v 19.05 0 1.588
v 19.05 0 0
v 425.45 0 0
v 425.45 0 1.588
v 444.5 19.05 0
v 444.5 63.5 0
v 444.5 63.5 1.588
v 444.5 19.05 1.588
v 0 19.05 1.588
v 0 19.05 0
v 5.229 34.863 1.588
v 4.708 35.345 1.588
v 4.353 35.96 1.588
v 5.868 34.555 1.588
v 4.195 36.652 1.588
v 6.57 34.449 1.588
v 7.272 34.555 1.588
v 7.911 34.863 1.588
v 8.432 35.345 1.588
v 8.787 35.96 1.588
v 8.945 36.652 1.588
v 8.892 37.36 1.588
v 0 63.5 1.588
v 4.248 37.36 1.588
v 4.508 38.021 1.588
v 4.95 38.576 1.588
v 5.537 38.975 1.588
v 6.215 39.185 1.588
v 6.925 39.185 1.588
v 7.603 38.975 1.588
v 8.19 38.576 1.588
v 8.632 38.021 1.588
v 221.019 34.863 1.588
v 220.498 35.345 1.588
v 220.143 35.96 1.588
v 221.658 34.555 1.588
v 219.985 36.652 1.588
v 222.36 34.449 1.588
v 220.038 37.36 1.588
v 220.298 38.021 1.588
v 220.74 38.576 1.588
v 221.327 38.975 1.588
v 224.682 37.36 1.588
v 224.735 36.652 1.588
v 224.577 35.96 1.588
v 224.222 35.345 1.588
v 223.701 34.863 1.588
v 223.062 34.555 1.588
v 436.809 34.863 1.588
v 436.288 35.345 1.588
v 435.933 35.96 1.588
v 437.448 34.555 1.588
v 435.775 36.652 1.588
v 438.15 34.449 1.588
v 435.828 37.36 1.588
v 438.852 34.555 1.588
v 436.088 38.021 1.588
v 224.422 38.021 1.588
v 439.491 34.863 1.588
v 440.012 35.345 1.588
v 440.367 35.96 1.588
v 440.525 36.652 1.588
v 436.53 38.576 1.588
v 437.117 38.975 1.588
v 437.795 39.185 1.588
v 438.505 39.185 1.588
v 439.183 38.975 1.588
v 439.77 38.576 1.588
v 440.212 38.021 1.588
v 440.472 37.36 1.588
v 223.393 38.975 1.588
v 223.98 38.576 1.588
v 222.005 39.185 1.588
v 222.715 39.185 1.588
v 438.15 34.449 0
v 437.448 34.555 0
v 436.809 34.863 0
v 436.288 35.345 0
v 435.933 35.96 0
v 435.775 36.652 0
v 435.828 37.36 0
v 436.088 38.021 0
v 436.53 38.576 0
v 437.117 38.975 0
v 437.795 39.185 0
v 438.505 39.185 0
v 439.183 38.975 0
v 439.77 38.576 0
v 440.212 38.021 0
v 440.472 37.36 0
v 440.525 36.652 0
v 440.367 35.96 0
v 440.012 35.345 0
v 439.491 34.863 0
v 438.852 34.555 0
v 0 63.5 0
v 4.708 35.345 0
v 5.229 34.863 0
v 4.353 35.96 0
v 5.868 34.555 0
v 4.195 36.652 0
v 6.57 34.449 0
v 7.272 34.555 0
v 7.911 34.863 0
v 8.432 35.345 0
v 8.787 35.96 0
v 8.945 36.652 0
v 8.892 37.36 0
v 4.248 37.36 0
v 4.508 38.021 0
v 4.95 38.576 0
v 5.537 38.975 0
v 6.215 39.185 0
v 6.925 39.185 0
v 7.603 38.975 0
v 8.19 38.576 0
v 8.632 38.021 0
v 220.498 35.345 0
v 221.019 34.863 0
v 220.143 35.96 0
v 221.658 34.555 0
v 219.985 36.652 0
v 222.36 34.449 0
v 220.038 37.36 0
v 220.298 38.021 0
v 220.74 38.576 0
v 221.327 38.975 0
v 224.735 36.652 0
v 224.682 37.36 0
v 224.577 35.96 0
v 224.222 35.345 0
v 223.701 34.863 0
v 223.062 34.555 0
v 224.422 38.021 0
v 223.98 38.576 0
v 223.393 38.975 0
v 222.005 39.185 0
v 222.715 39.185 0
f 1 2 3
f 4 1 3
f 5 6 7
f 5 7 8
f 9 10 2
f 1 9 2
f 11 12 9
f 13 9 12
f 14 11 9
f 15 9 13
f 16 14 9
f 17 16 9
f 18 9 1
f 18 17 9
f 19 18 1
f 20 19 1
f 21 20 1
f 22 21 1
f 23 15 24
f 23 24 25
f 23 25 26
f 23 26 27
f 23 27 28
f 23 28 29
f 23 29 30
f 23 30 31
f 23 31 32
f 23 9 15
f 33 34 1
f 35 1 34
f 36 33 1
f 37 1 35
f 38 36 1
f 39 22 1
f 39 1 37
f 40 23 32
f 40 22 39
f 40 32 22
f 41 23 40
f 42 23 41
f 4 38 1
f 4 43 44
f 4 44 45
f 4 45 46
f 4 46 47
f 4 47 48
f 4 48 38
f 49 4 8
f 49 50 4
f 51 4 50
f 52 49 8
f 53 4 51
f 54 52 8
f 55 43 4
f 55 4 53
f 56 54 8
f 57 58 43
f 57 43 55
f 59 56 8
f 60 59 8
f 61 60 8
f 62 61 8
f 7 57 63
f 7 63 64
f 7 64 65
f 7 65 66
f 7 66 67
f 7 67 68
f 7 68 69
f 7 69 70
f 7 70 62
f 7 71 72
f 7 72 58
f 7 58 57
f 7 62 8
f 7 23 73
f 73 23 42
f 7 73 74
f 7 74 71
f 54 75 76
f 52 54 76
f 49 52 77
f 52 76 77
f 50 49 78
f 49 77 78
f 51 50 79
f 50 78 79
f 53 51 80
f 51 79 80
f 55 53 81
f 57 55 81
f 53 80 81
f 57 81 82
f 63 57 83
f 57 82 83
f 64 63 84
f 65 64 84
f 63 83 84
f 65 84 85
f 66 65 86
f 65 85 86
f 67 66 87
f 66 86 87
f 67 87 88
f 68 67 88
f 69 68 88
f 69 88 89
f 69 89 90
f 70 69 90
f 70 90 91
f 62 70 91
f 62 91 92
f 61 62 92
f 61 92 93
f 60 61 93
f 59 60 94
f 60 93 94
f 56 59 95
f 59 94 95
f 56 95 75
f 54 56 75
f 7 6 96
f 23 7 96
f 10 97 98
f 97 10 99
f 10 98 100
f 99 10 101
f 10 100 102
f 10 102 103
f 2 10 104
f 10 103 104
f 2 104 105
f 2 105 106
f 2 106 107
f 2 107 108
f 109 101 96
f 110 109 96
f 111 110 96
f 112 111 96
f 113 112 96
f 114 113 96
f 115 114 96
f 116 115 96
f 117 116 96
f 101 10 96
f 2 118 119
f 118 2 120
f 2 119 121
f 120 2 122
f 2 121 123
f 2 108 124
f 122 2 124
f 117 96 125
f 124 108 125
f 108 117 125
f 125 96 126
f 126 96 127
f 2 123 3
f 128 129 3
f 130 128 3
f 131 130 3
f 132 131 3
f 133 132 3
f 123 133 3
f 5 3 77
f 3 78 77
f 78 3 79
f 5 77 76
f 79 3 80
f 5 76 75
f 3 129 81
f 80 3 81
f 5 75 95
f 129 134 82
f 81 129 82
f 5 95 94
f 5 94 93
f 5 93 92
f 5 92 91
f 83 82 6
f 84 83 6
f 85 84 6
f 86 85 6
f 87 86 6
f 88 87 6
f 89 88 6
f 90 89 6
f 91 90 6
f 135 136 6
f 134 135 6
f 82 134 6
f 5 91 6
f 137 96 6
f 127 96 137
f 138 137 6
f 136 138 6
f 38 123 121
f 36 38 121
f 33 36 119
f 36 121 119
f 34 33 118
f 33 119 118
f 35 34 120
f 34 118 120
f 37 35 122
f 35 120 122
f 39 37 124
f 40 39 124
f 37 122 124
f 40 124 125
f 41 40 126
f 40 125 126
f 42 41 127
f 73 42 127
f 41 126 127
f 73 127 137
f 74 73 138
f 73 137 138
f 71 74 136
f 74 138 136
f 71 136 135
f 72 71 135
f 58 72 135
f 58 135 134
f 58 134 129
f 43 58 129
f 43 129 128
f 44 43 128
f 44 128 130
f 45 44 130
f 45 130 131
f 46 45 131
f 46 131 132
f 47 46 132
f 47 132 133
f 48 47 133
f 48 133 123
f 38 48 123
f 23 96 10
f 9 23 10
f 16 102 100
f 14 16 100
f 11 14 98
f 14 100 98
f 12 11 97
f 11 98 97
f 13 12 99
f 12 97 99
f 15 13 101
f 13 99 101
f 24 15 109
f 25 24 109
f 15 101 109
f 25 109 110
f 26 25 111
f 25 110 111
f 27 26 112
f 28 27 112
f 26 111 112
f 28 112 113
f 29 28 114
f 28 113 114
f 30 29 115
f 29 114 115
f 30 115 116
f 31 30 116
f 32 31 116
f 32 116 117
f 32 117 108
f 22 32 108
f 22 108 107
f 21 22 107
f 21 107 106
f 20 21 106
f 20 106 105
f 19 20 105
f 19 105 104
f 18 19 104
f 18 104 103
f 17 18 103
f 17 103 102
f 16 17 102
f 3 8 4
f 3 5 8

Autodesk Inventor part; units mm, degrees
ref_plane "YZ Plane" through (0, 0, 0) normal (1, 0, 0) x (0, 1, 0)
ref_plane "XZ Plane" through (0, 0, 0) normal (0, 1, 0) x (-1, 0, 0)
ref_plane "XY Plane" through (0, 0, 0) normal (0, 0, 1) x (1, 0, 0)
sketch "Sketch1" plane through (0, 0, 0) normal (0, 0, 1) x (1, 0, 0)
  line L0 (444.5, 63.5) -> (0, 63.5)
  line L1 (444.5, 30.48) -> (487.6052, 30.48) construction
  line L2 (0, 63.5) -> (0, 19.05)
  line L3 (0, 19.05) -> (35.921, 19.05) construction
  line L4 (0, 19.05) -> (28.7368, 19.05) construction
  line L5 (444.5, 63.5) -> (444.5, 19.05)
  line L6 (444.5, 19.05) -> (425.45, 0)
  line L7 (0, 19.05) -> (19.05, 0)
  line L8 (0, 19.05) -> (26.9408, 19.05) construction
  line L9 (19.05, 0) -> (425.45, 0)
  point P0 (0, 0)
  dimension "d0" = 444.5
  dimension "d38" = 44.45
  dimension "d41" = 44.45
  dimension "d42" = 135
  dimension "d43" = 45
extrude "Extrusion1" add sketch "Sketch1" along normal blind 1.5875
sketch "Sketch2" plane through (0, 0, 1.5875) normal (0, 0, 1) x (1, 0, 0)
  line L0 (0.22, 63.5) -> (0.22, 50.8)
  line L1 (0.22, 50.8) -> (12.92, 63.5)
  line L2 (444.5, 63.5) -> (0, 63.5) projected
  line L3 (0, 63.5) -> (0, 30.48) projected
  line L4 (0, 63.5) -> (6.57, 57.15)
  line L5 (6.57, 57.15) -> (6.57, 49.53)
  line L6 (6.57, 57.15) -> (14.19, 57.15) construction
  line L7 (444.5, 30.48) -> (444.5, 63.5) projected
  line L8 (444.5, 63.5) -> (444.5, 50.8)
  line L9 (444.5, 50.8) -> (431.8, 63.5)
  line L10 (431.8, 63.5) -> (444.5, 63.5)
  line L11 (444.5, 63.5) -> (438.15, 57.15)
  line L12 (438.15, 57.15) -> (438.15, 49.53)
  line L13 (438.15, 49.53) -> (6.57, 49.53)
  line L14 (20.32, 0) -> (414.02, 0) projected
  line L15 (429.26, 15.24) -> (444.5, 0)
  line L16 (425.45, 0) -> (444.5, 19.05) projected
  line L17 (434.975, 9.525) -> (419.7086, -5.7414)
  line L18 (438.15, 49.53) -> (438.15, 24.13)
  line L19 (6.57, 49.53) -> (6.57, 24.13)
  line L20 (6.57, 49.53) -> (31.97, 49.53) construction
  line L21 (222.36, 49.53) -> (222.36, 36.83)
  point P0 (0, 0)
  point P1 (0, 30.48)
  point P2 (30.48, 0)
  point P3 (25.4, 0)
  point P4 (415.2184, 20.3013)
  point P5 (6.57, 36.83)
  point P6 (438.15, 36.83)
  dimension "d9" = 12.7
  dimension "d10" = 45
  dimension "d20" = 7.62
  dimension "d21" = 90
  dimension "d22" = 12.7
  dimension "d23" = 45
  dimension "d24" = 7.62
  dimension "d44" = 21.59
  dimension "d48" = 25.4
  dimension "d49" = 25.4
  dimension "d50" = 90
hole "Hole2" at (6.57, 36.83, 1.5875) at (222.36, 36.83, 1.5875) at (438.15, 36.83, 1.5875) direction (0, 0, -1) diameter 4.7625 end through all
properties part number "sideskirt"
